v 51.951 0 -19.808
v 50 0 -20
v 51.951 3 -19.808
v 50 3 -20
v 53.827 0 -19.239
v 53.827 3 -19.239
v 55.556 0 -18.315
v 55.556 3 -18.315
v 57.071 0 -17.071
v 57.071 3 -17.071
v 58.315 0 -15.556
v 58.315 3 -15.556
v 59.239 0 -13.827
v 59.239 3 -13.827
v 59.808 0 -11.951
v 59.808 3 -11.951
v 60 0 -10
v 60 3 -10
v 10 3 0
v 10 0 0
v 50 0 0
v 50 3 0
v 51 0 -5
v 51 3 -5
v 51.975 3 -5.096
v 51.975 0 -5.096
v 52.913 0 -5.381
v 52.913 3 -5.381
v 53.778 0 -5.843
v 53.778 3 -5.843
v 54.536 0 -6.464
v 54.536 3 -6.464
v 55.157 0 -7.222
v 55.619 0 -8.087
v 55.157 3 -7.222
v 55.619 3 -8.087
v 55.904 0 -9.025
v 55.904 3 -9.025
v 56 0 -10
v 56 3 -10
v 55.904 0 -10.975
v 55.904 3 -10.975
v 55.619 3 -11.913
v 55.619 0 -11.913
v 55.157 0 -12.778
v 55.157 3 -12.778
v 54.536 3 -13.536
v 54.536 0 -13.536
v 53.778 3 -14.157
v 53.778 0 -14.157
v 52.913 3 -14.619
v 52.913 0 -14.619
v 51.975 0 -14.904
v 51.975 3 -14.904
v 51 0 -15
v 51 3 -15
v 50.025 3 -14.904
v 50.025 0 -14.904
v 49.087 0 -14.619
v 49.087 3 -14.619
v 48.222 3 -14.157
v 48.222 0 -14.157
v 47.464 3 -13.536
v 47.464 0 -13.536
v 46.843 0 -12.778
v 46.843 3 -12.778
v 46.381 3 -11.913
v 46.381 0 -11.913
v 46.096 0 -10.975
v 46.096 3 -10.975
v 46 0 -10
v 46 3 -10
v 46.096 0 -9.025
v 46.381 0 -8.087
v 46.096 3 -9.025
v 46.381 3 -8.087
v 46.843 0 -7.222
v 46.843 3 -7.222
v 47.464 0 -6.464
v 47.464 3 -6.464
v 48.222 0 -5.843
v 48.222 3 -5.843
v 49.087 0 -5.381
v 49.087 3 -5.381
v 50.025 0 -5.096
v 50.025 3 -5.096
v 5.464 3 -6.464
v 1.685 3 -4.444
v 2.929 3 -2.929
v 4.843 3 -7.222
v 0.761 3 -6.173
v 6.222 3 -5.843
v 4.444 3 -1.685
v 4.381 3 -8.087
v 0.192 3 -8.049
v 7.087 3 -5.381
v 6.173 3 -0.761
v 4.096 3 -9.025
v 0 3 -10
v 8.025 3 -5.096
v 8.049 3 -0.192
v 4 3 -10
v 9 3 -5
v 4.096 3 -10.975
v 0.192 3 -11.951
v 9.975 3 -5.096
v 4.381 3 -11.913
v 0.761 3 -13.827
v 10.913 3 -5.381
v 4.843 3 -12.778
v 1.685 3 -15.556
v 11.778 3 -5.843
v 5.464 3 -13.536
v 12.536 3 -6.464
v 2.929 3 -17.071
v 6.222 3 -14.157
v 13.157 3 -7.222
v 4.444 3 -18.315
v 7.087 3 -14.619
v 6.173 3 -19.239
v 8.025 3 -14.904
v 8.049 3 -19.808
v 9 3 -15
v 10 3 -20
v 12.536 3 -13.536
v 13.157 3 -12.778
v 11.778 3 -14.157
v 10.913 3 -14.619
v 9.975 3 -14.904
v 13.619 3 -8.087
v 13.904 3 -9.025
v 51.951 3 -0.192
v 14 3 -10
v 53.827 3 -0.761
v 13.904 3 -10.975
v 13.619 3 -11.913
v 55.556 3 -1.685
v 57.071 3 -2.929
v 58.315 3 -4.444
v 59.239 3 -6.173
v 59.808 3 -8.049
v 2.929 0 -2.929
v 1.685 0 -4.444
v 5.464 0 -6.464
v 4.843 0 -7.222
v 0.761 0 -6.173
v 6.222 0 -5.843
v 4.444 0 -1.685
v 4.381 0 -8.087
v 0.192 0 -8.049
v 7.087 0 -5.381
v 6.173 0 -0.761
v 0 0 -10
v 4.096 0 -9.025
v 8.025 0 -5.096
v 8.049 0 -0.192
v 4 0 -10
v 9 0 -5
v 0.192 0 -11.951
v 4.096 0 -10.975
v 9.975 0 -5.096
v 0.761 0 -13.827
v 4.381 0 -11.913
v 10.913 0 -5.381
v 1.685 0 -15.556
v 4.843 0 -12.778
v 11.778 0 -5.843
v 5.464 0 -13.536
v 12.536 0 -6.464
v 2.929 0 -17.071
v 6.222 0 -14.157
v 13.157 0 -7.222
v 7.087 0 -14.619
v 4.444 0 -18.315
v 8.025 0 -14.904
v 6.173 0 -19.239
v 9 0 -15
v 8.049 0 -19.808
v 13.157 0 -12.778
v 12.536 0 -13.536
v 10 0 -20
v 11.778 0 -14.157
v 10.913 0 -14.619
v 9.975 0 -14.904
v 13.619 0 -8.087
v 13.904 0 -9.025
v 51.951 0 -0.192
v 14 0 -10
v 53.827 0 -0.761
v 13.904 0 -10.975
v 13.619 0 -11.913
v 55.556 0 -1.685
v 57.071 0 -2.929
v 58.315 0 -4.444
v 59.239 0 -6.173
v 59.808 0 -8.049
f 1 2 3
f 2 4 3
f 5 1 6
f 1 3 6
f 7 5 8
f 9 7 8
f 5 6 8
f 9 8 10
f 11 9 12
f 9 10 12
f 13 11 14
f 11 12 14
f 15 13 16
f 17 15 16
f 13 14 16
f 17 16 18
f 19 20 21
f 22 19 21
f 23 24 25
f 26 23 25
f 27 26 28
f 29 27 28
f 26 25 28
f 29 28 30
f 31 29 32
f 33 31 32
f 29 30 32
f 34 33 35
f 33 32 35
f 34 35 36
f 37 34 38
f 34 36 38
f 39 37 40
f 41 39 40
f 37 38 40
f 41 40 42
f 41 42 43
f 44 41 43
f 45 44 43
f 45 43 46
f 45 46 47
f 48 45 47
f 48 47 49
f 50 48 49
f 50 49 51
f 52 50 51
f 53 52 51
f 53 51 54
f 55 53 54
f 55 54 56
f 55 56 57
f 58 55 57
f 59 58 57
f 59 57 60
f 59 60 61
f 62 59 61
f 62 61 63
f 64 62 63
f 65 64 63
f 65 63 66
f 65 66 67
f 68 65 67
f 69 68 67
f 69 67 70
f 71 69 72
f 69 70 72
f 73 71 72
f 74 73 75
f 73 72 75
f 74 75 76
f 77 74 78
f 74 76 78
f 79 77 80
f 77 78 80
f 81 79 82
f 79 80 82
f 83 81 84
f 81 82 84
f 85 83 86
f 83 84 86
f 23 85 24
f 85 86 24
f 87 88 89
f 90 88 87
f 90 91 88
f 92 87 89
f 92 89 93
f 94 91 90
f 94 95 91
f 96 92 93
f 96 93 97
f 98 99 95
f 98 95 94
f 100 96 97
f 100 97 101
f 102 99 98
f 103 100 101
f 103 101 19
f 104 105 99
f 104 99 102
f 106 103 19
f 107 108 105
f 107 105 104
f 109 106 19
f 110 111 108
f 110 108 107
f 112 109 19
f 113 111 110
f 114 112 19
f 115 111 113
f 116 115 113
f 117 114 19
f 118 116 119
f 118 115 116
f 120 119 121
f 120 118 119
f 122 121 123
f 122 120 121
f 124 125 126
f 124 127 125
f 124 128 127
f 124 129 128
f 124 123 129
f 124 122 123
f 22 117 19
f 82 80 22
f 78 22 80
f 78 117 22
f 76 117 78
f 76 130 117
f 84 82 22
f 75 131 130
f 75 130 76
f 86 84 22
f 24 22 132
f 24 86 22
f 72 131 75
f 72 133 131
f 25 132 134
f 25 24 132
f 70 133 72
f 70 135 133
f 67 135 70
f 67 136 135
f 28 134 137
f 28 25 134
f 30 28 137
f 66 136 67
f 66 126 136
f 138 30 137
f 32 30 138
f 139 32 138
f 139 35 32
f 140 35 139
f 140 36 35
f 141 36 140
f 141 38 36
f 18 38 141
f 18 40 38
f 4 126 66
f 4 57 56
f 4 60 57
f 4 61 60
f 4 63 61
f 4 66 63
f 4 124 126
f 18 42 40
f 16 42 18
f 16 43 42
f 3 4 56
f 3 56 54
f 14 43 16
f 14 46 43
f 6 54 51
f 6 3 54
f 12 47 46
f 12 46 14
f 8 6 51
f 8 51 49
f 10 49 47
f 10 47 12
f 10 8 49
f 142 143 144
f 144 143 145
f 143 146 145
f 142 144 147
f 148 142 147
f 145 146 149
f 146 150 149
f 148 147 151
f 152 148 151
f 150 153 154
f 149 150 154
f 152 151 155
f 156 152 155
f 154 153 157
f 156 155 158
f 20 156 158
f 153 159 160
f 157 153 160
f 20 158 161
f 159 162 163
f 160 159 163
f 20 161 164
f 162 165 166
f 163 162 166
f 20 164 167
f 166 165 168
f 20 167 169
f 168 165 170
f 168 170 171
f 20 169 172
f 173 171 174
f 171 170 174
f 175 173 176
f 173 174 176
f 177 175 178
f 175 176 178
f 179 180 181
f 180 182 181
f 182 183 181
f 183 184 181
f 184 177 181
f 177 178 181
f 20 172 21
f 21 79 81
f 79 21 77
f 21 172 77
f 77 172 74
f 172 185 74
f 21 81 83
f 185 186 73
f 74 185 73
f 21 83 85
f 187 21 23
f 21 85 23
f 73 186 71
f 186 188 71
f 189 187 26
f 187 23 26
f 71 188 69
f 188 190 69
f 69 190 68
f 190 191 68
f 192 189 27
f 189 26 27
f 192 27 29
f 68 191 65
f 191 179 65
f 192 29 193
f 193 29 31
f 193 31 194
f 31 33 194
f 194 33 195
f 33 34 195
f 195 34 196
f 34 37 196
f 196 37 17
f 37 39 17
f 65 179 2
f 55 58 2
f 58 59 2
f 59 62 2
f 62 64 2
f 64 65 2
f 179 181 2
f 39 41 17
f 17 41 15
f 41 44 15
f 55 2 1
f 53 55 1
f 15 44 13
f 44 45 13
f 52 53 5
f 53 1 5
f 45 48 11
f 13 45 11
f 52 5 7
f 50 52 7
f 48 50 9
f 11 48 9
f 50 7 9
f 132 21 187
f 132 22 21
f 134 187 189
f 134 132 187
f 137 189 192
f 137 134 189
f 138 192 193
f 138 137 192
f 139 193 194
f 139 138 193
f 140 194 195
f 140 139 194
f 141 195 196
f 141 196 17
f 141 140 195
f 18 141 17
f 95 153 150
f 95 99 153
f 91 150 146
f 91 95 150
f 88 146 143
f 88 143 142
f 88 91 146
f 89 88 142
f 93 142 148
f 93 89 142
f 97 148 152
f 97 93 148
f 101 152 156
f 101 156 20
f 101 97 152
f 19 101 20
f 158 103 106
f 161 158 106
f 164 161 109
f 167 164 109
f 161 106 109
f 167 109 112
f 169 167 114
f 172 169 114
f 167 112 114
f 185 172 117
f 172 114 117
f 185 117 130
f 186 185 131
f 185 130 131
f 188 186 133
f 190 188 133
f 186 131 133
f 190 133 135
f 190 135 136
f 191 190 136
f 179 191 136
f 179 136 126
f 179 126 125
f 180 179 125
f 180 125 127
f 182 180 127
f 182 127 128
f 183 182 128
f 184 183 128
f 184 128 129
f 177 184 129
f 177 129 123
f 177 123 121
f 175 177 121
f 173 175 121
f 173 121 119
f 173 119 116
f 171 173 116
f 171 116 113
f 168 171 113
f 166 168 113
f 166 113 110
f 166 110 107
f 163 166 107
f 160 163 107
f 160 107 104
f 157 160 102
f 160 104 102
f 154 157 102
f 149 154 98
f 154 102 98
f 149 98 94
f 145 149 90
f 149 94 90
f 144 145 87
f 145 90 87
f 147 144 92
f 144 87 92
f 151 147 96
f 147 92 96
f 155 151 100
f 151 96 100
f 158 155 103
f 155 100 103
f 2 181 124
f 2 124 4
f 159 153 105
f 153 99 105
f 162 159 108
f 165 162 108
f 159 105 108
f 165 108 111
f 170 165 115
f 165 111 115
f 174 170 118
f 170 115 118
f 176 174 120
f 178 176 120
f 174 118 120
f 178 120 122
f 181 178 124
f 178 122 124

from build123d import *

# Parameters (mm, degrees)
SKETCH2_W           = 60
SKETCH2_H           = 20
BOSS_EXTRUDE1_DEPTH = 3
SKETCH3_R           = 5
CUT_EXTRUDE1_DEPTH  = 64.316664473
SKETCH4_R           = 5
CUT_EXTRUDE2_DEPTH  = 64.316664473
FILLET1_R           = 10
FILLET2_R           = 10


with BuildPart() as part:
    # Sketch2 → Boss-Extrude1 (new body)
    with BuildSketch(Plane(origin=(0, 0, 0), x_dir=(1, 0, 0), z_dir=(0, 1, 0))):
        with Locations((30, 10)):
            Rectangle(SKETCH2_W, SKETCH2_H)
    extrude(amount=BOSS_EXTRUDE1_DEPTH)

    # Sketch3 → Cut-Extrude1 (cut, through all)
    with BuildSketch(Plane(origin=(0, 3, 0), x_dir=(1, 0, 0), z_dir=(0, 1, 0))):
        with Locations(Location((9, 10, 0), (0, 0, 270))):
            Circle(SKETCH3_R)
    extrude(amount=-CUT_EXTRUDE1_DEPTH, mode=Mode.SUBTRACT)

    # Sketch4 → Cut-Extrude2 (cut, through all)
    with BuildSketch(Plane(origin=(0, 3, 0), x_dir=(1, 0, 0), z_dir=(0, 1, 0))):
        with Locations(Location((51, 10, 0), (0, 0, 270))):
            Circle(SKETCH4_R)
    extrude(amount=-CUT_EXTRUDE2_DEPTH, mode=Mode.SUBTRACT)

    # Fillet1
    fillet1_edges = [part.edges().sort_by_distance(p)[0] for p in [
        (0, 1.5, -20),
        (0, 1.5, 0),
    ]]
    fillet(fillet1_edges, radius=FILLET1_R - 0.0001)  # a hair under: the kernel refuses the full size

    # Fillet2
    fillet2_edges = [part.edges().sort_by_distance(p)[0] for p in [
        (60, 1.5, -20),
        (60, 1.5, 0),
    ]]
    fillet(fillet2_edges, radius=FILLET2_R - 0.0001)  # a hair under: the kernel refuses the full size


solid = part.part
